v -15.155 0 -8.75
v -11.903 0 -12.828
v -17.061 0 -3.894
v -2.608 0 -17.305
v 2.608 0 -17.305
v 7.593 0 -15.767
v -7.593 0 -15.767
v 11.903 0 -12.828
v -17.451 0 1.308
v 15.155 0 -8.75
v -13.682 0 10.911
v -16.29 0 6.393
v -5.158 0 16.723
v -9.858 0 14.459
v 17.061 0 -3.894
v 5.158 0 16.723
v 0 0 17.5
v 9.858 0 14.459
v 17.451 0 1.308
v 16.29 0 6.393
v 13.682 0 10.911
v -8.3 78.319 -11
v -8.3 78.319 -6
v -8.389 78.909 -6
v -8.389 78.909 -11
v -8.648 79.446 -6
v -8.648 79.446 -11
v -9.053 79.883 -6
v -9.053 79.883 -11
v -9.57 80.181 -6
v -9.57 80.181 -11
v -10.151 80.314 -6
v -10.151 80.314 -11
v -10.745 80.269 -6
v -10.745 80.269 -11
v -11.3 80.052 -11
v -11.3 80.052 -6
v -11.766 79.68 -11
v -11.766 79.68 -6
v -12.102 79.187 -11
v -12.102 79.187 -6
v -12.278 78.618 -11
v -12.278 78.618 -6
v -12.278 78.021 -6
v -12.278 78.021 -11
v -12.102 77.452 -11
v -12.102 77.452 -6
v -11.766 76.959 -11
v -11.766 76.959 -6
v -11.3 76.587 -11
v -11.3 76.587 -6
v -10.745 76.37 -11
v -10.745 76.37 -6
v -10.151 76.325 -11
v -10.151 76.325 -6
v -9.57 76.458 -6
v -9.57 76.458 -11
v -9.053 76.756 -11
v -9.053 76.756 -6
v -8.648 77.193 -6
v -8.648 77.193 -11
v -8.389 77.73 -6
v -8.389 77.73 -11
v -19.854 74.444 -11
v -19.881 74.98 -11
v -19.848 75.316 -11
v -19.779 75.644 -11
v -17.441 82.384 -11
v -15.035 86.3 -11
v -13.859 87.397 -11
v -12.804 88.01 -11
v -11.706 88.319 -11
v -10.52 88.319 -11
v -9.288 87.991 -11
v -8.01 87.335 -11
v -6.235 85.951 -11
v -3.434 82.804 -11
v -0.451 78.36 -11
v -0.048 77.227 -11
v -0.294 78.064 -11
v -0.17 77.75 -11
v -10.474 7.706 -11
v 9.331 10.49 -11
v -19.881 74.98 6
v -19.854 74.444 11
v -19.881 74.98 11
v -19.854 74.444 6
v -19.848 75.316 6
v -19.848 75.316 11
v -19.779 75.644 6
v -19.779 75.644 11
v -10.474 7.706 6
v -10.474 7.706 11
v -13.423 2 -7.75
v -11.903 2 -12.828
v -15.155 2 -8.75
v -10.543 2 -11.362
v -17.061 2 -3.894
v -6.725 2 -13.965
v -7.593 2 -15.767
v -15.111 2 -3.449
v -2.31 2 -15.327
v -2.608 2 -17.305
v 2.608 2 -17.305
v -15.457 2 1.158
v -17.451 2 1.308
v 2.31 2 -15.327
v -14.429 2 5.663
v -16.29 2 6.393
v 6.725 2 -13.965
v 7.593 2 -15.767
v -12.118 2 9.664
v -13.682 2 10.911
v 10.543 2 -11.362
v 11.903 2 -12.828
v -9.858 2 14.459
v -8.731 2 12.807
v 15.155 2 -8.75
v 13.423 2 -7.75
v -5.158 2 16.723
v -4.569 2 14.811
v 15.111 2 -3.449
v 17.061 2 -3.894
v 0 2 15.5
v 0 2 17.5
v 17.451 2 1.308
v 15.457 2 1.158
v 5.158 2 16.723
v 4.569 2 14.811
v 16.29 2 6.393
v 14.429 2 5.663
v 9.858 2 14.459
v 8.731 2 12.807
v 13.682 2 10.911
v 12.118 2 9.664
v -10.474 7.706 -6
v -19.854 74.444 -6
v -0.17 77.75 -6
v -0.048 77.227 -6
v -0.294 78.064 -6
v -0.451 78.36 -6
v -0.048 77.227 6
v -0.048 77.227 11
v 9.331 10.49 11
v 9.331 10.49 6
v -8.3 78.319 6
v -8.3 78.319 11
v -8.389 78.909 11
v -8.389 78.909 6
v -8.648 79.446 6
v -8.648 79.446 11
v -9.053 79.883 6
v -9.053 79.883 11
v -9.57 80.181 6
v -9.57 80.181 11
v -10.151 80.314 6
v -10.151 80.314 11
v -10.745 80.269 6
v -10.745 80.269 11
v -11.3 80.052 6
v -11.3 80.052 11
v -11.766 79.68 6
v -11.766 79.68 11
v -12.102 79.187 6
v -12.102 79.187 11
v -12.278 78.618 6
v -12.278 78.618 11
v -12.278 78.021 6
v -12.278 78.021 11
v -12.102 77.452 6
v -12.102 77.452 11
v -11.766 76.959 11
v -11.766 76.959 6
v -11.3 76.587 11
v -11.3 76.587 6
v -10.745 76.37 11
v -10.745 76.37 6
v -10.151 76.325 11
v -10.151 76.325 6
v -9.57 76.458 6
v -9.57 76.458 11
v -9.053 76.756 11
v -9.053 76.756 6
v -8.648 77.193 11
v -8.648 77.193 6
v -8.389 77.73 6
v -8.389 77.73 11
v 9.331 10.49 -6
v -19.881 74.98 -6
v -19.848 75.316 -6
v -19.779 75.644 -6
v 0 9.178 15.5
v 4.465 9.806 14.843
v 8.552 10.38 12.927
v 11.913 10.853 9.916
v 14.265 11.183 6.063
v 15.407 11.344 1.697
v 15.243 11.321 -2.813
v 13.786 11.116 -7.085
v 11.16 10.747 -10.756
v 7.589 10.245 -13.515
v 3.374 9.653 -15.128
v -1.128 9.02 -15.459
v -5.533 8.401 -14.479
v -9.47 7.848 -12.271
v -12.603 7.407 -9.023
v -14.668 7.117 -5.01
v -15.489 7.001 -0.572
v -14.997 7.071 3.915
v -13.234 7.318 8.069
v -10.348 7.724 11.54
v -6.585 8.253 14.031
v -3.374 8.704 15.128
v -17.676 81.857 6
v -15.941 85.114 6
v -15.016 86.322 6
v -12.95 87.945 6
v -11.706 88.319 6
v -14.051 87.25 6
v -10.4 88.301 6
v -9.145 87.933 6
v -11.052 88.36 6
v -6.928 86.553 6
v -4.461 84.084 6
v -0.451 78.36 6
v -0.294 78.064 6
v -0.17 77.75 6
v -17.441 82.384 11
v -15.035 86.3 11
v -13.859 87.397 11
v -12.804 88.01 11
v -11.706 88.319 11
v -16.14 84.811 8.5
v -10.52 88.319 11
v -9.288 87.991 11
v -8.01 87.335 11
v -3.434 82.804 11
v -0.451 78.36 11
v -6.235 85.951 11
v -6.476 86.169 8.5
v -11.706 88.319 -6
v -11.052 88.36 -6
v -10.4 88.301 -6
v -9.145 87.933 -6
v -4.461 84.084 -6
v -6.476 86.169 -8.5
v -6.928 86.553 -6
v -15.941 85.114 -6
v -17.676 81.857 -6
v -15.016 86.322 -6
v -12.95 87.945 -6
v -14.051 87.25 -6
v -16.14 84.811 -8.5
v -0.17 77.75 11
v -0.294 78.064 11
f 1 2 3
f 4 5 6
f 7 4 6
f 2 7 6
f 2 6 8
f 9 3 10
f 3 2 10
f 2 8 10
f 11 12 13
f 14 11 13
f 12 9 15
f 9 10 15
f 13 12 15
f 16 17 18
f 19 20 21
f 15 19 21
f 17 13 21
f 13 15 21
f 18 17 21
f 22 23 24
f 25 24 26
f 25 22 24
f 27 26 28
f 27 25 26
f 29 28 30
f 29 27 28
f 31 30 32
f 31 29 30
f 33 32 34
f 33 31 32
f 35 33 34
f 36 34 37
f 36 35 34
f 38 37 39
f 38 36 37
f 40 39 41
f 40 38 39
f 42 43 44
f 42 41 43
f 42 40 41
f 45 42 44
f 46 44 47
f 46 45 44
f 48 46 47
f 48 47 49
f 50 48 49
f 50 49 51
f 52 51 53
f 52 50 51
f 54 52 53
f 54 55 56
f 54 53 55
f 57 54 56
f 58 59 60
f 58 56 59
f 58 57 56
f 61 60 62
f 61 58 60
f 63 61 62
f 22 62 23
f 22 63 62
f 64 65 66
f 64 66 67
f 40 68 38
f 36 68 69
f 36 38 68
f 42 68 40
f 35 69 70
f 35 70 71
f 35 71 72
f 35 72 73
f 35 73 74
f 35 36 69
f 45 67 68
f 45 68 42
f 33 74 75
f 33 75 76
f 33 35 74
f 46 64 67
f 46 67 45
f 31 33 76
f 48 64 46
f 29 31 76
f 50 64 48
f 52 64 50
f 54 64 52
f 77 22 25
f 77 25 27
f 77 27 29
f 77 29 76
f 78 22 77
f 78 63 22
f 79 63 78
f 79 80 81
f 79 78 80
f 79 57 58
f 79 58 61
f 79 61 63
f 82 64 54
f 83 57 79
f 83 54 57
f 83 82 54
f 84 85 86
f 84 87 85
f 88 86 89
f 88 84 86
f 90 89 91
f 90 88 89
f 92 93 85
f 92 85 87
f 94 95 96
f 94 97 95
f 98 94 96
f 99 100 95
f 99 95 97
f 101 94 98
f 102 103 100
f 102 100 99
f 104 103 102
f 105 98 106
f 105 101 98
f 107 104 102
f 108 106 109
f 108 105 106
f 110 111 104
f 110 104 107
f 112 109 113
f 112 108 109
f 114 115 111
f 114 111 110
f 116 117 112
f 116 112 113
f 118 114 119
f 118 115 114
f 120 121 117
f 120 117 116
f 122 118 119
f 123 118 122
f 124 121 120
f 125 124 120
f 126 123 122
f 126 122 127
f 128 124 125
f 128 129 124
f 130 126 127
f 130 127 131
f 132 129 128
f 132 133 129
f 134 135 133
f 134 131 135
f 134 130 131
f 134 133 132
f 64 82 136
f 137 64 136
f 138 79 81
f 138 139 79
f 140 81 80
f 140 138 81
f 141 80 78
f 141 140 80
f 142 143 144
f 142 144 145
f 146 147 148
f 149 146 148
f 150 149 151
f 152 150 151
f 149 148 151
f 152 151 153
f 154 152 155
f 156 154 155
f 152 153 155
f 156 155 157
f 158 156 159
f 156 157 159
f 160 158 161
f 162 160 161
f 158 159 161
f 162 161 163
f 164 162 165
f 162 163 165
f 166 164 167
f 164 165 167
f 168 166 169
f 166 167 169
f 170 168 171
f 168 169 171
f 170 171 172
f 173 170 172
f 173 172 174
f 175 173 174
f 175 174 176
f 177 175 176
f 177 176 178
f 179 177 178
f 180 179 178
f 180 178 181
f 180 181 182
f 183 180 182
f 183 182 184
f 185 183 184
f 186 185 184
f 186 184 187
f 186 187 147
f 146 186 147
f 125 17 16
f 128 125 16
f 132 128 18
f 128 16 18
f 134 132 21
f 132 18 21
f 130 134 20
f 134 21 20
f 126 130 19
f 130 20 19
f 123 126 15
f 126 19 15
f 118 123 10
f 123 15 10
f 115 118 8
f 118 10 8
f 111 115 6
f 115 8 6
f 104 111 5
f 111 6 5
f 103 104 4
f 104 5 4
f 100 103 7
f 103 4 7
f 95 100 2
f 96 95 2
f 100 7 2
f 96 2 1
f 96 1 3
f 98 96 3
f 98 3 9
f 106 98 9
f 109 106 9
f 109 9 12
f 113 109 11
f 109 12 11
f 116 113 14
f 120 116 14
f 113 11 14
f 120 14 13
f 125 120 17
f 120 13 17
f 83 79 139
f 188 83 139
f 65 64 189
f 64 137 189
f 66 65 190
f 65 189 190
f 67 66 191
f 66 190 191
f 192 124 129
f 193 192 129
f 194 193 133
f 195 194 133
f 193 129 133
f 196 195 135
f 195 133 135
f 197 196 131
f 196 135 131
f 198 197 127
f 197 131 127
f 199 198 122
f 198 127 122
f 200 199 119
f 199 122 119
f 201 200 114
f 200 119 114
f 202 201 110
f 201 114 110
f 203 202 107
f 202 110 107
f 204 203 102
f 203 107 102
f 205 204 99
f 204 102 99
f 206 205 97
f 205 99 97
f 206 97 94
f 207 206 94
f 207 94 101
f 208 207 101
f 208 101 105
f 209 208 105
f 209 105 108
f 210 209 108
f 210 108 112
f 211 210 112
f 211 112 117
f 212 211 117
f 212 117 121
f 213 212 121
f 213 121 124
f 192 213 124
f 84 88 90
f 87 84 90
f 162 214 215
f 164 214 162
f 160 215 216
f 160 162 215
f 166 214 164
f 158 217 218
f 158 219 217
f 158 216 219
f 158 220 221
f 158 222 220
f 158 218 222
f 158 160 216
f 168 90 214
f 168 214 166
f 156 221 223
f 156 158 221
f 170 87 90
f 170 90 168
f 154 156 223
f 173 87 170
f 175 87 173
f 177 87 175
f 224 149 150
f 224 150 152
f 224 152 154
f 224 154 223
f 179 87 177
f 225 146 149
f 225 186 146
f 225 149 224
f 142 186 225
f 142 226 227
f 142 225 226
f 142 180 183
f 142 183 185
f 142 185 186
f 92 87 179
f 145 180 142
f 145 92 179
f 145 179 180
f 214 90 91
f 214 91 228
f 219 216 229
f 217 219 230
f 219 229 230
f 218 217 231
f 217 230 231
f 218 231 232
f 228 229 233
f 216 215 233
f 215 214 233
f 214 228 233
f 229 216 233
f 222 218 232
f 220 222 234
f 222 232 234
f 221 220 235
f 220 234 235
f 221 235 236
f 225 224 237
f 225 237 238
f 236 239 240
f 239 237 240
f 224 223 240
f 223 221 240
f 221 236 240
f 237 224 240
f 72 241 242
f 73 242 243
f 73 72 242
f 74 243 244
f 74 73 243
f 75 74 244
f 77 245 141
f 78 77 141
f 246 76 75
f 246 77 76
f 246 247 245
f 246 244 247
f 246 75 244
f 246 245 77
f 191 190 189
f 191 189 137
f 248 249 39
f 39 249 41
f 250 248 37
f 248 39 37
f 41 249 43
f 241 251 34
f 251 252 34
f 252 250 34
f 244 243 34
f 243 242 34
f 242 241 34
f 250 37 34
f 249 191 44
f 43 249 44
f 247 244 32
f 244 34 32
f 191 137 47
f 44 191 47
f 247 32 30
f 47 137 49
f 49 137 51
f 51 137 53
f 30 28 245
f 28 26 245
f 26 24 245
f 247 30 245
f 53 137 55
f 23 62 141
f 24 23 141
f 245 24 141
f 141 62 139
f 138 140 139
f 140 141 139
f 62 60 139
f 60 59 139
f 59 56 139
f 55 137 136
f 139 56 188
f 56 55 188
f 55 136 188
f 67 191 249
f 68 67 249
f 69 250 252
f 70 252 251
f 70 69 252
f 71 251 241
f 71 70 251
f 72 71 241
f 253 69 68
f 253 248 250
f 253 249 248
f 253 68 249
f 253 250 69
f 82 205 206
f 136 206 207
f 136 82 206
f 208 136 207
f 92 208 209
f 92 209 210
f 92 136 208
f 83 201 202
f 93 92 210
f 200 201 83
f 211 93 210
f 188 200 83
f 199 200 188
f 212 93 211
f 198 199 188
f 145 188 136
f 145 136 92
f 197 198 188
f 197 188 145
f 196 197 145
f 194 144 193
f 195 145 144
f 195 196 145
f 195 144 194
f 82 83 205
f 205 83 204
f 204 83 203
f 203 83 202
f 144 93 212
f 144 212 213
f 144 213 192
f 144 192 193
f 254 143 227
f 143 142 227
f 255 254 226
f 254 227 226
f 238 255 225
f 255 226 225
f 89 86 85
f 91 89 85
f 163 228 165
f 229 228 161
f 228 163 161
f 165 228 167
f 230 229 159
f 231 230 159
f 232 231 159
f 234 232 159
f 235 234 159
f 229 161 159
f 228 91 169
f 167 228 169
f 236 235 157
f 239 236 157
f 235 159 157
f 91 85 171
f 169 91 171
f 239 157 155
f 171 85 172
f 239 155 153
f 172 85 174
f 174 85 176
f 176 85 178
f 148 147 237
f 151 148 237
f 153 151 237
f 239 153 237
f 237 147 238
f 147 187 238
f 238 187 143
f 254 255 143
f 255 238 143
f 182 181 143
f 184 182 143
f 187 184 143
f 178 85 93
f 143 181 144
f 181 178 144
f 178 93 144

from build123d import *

# Parameters (mm, degrees)
CROQUIS2_R              = 17.5
SALIENTE_EXTRUIR1_DEPTH = 2
CROQUIS3_R              = 15.5
SALIENTE_EXTRUIR2_DEPTH = 10
CROQUIS6_W              = 20
CROQUIS6_H              = 5
SALIENTE_EXTRUIR4_DEPTH = 80
CROQUIS7_R              = 2
CORTAR_EXTRUIR4_DEPTH   = 97.577783797
REDONDEO1_R             = 3


with BuildPart() as part:
    # Croquis2 → Saliente-Extruir1 (new body)
    with BuildSketch(Plane(origin=(0, 0, 0), x_dir=(1, 0, 0), z_dir=(0, 1, 0))):
        with Locations(Location((0, 0, 0), (0, 0, 270))):
            Circle(CROQUIS2_R)
    extrude(amount=SALIENTE_EXTRUIR1_DEPTH)

    # Croquis3 → Saliente-Extruir2 (add)
    with BuildSketch(Plane(origin=(0, 2, 0), x_dir=(1, 0, 0), z_dir=(0, 1, 0))):
        with Locations(Location((0, 0, 0), (0, 0, 270))):
            Circle(CROQUIS3_R)
    extrude(amount=SALIENTE_EXTRUIR2_DEPTH)

    # Cortar con superficie2
    split(bisect_by=Plane(origin=(-1.264952602, 9.000605443, 0), x_dir=(0, 0, 1), z_dir=(-0.13917310096006574, 0.9902680687415703, 0)), keep=Keep.BOTTOM)

    # Croquis6 → Saliente-Extruir4 (add)
    with BuildSketch(Plane(origin=(-1.264952602, 9.000605443, 0), x_dir=(0.9902680687415704, 0.13917310096006577, 0), z_dir=(-0.13917310096006577, 0.9902680687415704, 0))):
        with Locations((0.7, -8.5)):
            Rectangle(CROQUIS6_W, CROQUIS6_H)
    saliente_extruir4 = extrude(amount=SALIENTE_EXTRUIR4_DEPTH)

    # Croquis7 → Cortar-Extruir4 (cut, through all)
    with BuildSketch(Plane.XY.offset(11)):
        with BuildLine():
            Line((-21.608293718, 86.927741104), (-19.938216506, 75.044524279))
            add(Edge.make_bspline(
                [(-19.938216506, 75.044524279), (-16.656953462, 87.623606273), (-11.705613295, 88.319472076)],
                knots=[0, 0, 0, 0.499999987, 0.499999987, 0.499999987], degree=2))
            Line((-11.705613295, 88.319472076), (-21.608293718, 86.927741104))
        make_face()
        with BuildLine():
            Line((-1.802932343, 89.711203123), (-11.705613295, 88.319472076))
            add(Edge.make_bspline(
                [(-11.705613295, 88.319472076), (-6.754272863, 89.015337917), (-0.132855132, 77.827986298)],
                knots=[0.499999987, 0.499999987, 0.499999987, 1, 1, 1], degree=2))
            Line((-0.132855132, 77.827986298), (-1.802932343, 89.711203123))
        make_face()
        with Locations((-10.300204683, 78.319472113)):
            Circle(CROQUIS7_R)
    cortar_extruir4 = extrude(amount=-CORTAR_EXTRUIR4_DEPTH, mode=Mode.SUBTRACT)

    # Simetría1: Saliente-Extruir4, Cortar-Extruir4 across plane
    add(saliente_extruir4.mirror(Plane.XY))
    add(cortar_extruir4.mirror(Plane.XY), mode=Mode.SUBTRACT)

    # Redondeo1
    redondeo1_edges = [part.edges().sort_by_distance(p)[0] for p in [
        (-0.132855132, 77.827986298, 8.5),
        (-19.938216506, 75.044524279, 8.5),
        (-0.132855132, 77.827986298, -8.5),
        (-19.938216506, 75.044524279, -8.5),
    ]]
    fillet(redondeo1_edges, radius=REDONDEO1_R)


solid = part.part
